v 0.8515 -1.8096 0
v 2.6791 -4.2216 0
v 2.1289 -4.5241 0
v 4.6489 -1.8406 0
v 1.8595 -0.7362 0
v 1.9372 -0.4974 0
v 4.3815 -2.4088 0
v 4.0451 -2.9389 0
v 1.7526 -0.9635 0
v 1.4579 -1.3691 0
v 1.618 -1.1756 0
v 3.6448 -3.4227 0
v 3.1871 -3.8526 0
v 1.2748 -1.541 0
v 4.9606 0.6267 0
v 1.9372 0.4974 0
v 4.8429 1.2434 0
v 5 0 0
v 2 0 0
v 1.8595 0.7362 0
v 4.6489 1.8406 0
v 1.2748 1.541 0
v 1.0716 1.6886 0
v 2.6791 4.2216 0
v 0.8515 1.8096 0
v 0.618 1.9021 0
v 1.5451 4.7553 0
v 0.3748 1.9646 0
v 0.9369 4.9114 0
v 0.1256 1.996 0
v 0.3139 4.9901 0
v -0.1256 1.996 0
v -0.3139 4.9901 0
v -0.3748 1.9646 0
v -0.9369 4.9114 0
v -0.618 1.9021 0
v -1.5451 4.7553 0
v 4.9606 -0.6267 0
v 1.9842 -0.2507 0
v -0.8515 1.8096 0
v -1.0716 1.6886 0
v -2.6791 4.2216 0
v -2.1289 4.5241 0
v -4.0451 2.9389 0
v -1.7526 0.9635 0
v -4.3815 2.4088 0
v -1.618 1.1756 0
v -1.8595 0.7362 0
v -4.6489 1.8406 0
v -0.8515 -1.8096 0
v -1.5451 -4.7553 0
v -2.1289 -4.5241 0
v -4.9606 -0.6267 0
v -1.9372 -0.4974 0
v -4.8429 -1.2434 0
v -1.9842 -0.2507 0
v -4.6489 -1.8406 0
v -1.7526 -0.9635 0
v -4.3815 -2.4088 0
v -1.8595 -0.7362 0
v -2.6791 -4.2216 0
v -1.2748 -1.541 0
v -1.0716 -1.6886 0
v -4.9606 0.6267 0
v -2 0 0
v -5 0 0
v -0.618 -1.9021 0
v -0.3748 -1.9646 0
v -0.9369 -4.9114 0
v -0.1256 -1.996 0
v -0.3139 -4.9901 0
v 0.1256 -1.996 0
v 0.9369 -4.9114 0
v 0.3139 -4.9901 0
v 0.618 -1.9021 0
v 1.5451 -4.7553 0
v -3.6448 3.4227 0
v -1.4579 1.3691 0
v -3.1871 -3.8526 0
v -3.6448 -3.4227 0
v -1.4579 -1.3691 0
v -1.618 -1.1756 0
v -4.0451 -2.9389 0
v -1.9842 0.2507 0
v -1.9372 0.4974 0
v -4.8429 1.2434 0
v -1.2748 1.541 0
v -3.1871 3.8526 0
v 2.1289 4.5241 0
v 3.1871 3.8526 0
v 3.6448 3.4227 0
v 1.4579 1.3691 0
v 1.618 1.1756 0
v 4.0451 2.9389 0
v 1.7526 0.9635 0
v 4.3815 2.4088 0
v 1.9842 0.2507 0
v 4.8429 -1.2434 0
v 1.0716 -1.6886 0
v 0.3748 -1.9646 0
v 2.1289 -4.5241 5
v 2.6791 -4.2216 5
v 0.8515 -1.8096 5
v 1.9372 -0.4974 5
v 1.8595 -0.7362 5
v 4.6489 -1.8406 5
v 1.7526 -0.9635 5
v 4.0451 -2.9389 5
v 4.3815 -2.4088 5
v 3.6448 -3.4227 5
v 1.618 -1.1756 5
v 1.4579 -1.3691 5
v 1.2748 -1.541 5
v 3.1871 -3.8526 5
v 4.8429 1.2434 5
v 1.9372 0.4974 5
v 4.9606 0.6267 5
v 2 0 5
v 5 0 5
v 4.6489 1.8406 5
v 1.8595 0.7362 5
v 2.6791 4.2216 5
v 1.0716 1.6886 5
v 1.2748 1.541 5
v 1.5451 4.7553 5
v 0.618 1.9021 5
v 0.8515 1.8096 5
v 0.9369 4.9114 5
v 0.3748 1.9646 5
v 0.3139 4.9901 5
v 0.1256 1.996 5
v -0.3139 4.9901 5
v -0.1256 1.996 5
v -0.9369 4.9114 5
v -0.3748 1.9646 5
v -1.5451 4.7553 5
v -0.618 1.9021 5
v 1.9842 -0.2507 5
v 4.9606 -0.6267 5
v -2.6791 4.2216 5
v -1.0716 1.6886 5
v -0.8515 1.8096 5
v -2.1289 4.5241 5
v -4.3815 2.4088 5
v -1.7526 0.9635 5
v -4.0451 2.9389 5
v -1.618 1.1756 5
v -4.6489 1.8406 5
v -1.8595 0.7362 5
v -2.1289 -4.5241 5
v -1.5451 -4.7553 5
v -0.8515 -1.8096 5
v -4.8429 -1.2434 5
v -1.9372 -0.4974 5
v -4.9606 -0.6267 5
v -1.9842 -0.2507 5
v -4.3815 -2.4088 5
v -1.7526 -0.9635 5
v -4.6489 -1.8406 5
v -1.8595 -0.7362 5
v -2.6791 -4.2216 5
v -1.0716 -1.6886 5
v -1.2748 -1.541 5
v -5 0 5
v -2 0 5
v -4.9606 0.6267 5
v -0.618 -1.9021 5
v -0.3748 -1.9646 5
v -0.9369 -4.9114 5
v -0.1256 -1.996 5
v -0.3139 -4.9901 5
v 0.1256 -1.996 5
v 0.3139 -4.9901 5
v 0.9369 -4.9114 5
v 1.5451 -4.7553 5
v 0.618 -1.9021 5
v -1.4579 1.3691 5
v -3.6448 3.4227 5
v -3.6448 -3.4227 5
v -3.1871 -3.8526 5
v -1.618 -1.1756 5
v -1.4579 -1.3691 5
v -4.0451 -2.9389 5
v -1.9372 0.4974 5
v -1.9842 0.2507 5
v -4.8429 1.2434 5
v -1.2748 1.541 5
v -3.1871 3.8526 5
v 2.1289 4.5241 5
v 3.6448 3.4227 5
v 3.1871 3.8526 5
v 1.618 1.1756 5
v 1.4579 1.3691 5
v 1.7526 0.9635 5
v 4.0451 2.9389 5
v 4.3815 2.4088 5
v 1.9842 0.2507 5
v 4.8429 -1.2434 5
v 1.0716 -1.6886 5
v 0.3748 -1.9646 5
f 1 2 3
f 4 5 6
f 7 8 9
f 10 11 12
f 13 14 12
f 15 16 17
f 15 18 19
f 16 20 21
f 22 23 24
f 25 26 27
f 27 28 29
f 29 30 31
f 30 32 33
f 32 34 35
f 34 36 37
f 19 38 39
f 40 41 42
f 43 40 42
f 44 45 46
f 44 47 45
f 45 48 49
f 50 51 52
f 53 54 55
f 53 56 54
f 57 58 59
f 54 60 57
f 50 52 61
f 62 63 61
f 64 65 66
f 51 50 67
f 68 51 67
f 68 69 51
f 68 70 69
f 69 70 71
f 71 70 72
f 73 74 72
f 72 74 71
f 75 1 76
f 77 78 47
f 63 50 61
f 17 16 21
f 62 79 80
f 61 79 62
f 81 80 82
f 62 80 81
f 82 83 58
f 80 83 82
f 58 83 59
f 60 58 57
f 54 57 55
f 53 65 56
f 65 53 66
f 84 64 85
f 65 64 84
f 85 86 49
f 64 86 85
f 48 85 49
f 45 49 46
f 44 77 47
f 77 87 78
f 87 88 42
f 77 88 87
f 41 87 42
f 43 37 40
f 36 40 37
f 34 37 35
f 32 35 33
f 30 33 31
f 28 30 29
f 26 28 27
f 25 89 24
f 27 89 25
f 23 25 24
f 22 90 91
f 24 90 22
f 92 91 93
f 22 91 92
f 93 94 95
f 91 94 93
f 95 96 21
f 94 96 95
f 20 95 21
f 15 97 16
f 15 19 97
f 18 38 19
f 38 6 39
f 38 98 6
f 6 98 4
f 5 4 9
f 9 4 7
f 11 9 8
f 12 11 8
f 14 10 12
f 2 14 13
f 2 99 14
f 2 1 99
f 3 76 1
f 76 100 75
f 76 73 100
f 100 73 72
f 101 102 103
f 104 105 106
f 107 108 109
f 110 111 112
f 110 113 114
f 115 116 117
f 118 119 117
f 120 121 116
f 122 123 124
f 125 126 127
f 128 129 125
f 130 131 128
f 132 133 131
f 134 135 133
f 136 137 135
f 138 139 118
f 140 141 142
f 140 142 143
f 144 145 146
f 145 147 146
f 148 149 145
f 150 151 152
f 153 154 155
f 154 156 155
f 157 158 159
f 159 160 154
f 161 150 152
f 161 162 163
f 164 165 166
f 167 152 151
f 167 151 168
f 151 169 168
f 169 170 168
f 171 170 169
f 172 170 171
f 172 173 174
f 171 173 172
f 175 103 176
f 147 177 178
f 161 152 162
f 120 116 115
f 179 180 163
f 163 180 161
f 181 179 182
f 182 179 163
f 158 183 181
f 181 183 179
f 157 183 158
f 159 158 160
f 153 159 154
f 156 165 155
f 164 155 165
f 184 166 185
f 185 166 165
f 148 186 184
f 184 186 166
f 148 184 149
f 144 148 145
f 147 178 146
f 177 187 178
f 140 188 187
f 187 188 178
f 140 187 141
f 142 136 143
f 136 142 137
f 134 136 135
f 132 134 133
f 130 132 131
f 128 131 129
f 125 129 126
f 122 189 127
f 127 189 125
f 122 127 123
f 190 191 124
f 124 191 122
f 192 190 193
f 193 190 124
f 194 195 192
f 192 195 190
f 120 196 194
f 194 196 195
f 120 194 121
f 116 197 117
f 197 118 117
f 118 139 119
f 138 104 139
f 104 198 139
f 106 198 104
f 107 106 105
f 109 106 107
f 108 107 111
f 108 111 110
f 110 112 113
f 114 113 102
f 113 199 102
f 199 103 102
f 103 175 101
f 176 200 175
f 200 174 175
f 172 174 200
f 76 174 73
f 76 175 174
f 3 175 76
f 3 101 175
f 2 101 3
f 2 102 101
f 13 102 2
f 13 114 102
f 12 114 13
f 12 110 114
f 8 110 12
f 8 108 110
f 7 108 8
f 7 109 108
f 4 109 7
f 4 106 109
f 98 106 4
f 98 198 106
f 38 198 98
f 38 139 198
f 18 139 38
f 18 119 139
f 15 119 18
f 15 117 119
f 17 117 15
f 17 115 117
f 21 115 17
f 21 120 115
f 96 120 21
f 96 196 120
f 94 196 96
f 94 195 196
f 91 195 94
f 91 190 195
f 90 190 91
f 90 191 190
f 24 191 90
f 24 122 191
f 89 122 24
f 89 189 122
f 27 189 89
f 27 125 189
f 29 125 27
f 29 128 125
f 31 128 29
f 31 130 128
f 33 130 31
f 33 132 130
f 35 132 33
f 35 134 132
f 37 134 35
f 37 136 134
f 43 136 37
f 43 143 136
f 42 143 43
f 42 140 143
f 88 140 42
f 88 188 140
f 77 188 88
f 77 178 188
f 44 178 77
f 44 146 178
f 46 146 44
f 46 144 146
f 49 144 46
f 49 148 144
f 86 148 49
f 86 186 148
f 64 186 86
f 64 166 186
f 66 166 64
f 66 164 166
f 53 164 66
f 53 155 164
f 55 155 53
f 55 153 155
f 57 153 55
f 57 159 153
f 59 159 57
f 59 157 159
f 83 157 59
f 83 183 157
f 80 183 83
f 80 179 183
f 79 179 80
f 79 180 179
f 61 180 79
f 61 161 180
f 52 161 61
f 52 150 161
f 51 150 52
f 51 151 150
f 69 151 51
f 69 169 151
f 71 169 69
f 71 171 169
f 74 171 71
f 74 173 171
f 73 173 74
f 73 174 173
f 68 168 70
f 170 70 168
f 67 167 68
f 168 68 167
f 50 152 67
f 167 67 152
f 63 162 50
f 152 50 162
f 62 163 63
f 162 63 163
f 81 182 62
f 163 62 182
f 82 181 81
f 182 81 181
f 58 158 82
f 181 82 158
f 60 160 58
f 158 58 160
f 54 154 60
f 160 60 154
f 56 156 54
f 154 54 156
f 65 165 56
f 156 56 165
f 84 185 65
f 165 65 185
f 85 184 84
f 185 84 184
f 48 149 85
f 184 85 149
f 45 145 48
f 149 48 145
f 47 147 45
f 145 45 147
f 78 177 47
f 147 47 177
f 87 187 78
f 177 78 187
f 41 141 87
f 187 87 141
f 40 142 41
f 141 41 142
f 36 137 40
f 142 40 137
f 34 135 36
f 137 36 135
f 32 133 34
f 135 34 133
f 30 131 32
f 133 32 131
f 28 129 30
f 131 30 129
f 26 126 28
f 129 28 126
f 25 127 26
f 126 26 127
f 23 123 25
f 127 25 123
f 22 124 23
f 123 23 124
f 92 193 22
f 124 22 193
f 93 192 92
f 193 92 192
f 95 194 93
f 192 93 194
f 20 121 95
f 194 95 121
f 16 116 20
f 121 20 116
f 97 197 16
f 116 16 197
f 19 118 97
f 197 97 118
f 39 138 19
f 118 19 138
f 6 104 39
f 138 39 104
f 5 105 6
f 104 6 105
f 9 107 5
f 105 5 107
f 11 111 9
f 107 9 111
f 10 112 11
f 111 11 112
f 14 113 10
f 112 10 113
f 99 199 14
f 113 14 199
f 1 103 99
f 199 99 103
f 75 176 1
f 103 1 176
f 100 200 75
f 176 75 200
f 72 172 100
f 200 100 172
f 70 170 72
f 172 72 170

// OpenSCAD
// Washer
// by Nathan Wittstock <nate@fardog.io>

// preview[view: south east, tilt: top diagonal]

/* [Params] */

diameter = 10;
screw_hole_d = 4;
thickness = 5;
resolution = 50;


linear_extrude(thickness)
    difference() {
        circle(d=diameter, center=true, $fn=resolution);
        circle(d=screw_hole_d, center=true, $fn=resolution);
    }
